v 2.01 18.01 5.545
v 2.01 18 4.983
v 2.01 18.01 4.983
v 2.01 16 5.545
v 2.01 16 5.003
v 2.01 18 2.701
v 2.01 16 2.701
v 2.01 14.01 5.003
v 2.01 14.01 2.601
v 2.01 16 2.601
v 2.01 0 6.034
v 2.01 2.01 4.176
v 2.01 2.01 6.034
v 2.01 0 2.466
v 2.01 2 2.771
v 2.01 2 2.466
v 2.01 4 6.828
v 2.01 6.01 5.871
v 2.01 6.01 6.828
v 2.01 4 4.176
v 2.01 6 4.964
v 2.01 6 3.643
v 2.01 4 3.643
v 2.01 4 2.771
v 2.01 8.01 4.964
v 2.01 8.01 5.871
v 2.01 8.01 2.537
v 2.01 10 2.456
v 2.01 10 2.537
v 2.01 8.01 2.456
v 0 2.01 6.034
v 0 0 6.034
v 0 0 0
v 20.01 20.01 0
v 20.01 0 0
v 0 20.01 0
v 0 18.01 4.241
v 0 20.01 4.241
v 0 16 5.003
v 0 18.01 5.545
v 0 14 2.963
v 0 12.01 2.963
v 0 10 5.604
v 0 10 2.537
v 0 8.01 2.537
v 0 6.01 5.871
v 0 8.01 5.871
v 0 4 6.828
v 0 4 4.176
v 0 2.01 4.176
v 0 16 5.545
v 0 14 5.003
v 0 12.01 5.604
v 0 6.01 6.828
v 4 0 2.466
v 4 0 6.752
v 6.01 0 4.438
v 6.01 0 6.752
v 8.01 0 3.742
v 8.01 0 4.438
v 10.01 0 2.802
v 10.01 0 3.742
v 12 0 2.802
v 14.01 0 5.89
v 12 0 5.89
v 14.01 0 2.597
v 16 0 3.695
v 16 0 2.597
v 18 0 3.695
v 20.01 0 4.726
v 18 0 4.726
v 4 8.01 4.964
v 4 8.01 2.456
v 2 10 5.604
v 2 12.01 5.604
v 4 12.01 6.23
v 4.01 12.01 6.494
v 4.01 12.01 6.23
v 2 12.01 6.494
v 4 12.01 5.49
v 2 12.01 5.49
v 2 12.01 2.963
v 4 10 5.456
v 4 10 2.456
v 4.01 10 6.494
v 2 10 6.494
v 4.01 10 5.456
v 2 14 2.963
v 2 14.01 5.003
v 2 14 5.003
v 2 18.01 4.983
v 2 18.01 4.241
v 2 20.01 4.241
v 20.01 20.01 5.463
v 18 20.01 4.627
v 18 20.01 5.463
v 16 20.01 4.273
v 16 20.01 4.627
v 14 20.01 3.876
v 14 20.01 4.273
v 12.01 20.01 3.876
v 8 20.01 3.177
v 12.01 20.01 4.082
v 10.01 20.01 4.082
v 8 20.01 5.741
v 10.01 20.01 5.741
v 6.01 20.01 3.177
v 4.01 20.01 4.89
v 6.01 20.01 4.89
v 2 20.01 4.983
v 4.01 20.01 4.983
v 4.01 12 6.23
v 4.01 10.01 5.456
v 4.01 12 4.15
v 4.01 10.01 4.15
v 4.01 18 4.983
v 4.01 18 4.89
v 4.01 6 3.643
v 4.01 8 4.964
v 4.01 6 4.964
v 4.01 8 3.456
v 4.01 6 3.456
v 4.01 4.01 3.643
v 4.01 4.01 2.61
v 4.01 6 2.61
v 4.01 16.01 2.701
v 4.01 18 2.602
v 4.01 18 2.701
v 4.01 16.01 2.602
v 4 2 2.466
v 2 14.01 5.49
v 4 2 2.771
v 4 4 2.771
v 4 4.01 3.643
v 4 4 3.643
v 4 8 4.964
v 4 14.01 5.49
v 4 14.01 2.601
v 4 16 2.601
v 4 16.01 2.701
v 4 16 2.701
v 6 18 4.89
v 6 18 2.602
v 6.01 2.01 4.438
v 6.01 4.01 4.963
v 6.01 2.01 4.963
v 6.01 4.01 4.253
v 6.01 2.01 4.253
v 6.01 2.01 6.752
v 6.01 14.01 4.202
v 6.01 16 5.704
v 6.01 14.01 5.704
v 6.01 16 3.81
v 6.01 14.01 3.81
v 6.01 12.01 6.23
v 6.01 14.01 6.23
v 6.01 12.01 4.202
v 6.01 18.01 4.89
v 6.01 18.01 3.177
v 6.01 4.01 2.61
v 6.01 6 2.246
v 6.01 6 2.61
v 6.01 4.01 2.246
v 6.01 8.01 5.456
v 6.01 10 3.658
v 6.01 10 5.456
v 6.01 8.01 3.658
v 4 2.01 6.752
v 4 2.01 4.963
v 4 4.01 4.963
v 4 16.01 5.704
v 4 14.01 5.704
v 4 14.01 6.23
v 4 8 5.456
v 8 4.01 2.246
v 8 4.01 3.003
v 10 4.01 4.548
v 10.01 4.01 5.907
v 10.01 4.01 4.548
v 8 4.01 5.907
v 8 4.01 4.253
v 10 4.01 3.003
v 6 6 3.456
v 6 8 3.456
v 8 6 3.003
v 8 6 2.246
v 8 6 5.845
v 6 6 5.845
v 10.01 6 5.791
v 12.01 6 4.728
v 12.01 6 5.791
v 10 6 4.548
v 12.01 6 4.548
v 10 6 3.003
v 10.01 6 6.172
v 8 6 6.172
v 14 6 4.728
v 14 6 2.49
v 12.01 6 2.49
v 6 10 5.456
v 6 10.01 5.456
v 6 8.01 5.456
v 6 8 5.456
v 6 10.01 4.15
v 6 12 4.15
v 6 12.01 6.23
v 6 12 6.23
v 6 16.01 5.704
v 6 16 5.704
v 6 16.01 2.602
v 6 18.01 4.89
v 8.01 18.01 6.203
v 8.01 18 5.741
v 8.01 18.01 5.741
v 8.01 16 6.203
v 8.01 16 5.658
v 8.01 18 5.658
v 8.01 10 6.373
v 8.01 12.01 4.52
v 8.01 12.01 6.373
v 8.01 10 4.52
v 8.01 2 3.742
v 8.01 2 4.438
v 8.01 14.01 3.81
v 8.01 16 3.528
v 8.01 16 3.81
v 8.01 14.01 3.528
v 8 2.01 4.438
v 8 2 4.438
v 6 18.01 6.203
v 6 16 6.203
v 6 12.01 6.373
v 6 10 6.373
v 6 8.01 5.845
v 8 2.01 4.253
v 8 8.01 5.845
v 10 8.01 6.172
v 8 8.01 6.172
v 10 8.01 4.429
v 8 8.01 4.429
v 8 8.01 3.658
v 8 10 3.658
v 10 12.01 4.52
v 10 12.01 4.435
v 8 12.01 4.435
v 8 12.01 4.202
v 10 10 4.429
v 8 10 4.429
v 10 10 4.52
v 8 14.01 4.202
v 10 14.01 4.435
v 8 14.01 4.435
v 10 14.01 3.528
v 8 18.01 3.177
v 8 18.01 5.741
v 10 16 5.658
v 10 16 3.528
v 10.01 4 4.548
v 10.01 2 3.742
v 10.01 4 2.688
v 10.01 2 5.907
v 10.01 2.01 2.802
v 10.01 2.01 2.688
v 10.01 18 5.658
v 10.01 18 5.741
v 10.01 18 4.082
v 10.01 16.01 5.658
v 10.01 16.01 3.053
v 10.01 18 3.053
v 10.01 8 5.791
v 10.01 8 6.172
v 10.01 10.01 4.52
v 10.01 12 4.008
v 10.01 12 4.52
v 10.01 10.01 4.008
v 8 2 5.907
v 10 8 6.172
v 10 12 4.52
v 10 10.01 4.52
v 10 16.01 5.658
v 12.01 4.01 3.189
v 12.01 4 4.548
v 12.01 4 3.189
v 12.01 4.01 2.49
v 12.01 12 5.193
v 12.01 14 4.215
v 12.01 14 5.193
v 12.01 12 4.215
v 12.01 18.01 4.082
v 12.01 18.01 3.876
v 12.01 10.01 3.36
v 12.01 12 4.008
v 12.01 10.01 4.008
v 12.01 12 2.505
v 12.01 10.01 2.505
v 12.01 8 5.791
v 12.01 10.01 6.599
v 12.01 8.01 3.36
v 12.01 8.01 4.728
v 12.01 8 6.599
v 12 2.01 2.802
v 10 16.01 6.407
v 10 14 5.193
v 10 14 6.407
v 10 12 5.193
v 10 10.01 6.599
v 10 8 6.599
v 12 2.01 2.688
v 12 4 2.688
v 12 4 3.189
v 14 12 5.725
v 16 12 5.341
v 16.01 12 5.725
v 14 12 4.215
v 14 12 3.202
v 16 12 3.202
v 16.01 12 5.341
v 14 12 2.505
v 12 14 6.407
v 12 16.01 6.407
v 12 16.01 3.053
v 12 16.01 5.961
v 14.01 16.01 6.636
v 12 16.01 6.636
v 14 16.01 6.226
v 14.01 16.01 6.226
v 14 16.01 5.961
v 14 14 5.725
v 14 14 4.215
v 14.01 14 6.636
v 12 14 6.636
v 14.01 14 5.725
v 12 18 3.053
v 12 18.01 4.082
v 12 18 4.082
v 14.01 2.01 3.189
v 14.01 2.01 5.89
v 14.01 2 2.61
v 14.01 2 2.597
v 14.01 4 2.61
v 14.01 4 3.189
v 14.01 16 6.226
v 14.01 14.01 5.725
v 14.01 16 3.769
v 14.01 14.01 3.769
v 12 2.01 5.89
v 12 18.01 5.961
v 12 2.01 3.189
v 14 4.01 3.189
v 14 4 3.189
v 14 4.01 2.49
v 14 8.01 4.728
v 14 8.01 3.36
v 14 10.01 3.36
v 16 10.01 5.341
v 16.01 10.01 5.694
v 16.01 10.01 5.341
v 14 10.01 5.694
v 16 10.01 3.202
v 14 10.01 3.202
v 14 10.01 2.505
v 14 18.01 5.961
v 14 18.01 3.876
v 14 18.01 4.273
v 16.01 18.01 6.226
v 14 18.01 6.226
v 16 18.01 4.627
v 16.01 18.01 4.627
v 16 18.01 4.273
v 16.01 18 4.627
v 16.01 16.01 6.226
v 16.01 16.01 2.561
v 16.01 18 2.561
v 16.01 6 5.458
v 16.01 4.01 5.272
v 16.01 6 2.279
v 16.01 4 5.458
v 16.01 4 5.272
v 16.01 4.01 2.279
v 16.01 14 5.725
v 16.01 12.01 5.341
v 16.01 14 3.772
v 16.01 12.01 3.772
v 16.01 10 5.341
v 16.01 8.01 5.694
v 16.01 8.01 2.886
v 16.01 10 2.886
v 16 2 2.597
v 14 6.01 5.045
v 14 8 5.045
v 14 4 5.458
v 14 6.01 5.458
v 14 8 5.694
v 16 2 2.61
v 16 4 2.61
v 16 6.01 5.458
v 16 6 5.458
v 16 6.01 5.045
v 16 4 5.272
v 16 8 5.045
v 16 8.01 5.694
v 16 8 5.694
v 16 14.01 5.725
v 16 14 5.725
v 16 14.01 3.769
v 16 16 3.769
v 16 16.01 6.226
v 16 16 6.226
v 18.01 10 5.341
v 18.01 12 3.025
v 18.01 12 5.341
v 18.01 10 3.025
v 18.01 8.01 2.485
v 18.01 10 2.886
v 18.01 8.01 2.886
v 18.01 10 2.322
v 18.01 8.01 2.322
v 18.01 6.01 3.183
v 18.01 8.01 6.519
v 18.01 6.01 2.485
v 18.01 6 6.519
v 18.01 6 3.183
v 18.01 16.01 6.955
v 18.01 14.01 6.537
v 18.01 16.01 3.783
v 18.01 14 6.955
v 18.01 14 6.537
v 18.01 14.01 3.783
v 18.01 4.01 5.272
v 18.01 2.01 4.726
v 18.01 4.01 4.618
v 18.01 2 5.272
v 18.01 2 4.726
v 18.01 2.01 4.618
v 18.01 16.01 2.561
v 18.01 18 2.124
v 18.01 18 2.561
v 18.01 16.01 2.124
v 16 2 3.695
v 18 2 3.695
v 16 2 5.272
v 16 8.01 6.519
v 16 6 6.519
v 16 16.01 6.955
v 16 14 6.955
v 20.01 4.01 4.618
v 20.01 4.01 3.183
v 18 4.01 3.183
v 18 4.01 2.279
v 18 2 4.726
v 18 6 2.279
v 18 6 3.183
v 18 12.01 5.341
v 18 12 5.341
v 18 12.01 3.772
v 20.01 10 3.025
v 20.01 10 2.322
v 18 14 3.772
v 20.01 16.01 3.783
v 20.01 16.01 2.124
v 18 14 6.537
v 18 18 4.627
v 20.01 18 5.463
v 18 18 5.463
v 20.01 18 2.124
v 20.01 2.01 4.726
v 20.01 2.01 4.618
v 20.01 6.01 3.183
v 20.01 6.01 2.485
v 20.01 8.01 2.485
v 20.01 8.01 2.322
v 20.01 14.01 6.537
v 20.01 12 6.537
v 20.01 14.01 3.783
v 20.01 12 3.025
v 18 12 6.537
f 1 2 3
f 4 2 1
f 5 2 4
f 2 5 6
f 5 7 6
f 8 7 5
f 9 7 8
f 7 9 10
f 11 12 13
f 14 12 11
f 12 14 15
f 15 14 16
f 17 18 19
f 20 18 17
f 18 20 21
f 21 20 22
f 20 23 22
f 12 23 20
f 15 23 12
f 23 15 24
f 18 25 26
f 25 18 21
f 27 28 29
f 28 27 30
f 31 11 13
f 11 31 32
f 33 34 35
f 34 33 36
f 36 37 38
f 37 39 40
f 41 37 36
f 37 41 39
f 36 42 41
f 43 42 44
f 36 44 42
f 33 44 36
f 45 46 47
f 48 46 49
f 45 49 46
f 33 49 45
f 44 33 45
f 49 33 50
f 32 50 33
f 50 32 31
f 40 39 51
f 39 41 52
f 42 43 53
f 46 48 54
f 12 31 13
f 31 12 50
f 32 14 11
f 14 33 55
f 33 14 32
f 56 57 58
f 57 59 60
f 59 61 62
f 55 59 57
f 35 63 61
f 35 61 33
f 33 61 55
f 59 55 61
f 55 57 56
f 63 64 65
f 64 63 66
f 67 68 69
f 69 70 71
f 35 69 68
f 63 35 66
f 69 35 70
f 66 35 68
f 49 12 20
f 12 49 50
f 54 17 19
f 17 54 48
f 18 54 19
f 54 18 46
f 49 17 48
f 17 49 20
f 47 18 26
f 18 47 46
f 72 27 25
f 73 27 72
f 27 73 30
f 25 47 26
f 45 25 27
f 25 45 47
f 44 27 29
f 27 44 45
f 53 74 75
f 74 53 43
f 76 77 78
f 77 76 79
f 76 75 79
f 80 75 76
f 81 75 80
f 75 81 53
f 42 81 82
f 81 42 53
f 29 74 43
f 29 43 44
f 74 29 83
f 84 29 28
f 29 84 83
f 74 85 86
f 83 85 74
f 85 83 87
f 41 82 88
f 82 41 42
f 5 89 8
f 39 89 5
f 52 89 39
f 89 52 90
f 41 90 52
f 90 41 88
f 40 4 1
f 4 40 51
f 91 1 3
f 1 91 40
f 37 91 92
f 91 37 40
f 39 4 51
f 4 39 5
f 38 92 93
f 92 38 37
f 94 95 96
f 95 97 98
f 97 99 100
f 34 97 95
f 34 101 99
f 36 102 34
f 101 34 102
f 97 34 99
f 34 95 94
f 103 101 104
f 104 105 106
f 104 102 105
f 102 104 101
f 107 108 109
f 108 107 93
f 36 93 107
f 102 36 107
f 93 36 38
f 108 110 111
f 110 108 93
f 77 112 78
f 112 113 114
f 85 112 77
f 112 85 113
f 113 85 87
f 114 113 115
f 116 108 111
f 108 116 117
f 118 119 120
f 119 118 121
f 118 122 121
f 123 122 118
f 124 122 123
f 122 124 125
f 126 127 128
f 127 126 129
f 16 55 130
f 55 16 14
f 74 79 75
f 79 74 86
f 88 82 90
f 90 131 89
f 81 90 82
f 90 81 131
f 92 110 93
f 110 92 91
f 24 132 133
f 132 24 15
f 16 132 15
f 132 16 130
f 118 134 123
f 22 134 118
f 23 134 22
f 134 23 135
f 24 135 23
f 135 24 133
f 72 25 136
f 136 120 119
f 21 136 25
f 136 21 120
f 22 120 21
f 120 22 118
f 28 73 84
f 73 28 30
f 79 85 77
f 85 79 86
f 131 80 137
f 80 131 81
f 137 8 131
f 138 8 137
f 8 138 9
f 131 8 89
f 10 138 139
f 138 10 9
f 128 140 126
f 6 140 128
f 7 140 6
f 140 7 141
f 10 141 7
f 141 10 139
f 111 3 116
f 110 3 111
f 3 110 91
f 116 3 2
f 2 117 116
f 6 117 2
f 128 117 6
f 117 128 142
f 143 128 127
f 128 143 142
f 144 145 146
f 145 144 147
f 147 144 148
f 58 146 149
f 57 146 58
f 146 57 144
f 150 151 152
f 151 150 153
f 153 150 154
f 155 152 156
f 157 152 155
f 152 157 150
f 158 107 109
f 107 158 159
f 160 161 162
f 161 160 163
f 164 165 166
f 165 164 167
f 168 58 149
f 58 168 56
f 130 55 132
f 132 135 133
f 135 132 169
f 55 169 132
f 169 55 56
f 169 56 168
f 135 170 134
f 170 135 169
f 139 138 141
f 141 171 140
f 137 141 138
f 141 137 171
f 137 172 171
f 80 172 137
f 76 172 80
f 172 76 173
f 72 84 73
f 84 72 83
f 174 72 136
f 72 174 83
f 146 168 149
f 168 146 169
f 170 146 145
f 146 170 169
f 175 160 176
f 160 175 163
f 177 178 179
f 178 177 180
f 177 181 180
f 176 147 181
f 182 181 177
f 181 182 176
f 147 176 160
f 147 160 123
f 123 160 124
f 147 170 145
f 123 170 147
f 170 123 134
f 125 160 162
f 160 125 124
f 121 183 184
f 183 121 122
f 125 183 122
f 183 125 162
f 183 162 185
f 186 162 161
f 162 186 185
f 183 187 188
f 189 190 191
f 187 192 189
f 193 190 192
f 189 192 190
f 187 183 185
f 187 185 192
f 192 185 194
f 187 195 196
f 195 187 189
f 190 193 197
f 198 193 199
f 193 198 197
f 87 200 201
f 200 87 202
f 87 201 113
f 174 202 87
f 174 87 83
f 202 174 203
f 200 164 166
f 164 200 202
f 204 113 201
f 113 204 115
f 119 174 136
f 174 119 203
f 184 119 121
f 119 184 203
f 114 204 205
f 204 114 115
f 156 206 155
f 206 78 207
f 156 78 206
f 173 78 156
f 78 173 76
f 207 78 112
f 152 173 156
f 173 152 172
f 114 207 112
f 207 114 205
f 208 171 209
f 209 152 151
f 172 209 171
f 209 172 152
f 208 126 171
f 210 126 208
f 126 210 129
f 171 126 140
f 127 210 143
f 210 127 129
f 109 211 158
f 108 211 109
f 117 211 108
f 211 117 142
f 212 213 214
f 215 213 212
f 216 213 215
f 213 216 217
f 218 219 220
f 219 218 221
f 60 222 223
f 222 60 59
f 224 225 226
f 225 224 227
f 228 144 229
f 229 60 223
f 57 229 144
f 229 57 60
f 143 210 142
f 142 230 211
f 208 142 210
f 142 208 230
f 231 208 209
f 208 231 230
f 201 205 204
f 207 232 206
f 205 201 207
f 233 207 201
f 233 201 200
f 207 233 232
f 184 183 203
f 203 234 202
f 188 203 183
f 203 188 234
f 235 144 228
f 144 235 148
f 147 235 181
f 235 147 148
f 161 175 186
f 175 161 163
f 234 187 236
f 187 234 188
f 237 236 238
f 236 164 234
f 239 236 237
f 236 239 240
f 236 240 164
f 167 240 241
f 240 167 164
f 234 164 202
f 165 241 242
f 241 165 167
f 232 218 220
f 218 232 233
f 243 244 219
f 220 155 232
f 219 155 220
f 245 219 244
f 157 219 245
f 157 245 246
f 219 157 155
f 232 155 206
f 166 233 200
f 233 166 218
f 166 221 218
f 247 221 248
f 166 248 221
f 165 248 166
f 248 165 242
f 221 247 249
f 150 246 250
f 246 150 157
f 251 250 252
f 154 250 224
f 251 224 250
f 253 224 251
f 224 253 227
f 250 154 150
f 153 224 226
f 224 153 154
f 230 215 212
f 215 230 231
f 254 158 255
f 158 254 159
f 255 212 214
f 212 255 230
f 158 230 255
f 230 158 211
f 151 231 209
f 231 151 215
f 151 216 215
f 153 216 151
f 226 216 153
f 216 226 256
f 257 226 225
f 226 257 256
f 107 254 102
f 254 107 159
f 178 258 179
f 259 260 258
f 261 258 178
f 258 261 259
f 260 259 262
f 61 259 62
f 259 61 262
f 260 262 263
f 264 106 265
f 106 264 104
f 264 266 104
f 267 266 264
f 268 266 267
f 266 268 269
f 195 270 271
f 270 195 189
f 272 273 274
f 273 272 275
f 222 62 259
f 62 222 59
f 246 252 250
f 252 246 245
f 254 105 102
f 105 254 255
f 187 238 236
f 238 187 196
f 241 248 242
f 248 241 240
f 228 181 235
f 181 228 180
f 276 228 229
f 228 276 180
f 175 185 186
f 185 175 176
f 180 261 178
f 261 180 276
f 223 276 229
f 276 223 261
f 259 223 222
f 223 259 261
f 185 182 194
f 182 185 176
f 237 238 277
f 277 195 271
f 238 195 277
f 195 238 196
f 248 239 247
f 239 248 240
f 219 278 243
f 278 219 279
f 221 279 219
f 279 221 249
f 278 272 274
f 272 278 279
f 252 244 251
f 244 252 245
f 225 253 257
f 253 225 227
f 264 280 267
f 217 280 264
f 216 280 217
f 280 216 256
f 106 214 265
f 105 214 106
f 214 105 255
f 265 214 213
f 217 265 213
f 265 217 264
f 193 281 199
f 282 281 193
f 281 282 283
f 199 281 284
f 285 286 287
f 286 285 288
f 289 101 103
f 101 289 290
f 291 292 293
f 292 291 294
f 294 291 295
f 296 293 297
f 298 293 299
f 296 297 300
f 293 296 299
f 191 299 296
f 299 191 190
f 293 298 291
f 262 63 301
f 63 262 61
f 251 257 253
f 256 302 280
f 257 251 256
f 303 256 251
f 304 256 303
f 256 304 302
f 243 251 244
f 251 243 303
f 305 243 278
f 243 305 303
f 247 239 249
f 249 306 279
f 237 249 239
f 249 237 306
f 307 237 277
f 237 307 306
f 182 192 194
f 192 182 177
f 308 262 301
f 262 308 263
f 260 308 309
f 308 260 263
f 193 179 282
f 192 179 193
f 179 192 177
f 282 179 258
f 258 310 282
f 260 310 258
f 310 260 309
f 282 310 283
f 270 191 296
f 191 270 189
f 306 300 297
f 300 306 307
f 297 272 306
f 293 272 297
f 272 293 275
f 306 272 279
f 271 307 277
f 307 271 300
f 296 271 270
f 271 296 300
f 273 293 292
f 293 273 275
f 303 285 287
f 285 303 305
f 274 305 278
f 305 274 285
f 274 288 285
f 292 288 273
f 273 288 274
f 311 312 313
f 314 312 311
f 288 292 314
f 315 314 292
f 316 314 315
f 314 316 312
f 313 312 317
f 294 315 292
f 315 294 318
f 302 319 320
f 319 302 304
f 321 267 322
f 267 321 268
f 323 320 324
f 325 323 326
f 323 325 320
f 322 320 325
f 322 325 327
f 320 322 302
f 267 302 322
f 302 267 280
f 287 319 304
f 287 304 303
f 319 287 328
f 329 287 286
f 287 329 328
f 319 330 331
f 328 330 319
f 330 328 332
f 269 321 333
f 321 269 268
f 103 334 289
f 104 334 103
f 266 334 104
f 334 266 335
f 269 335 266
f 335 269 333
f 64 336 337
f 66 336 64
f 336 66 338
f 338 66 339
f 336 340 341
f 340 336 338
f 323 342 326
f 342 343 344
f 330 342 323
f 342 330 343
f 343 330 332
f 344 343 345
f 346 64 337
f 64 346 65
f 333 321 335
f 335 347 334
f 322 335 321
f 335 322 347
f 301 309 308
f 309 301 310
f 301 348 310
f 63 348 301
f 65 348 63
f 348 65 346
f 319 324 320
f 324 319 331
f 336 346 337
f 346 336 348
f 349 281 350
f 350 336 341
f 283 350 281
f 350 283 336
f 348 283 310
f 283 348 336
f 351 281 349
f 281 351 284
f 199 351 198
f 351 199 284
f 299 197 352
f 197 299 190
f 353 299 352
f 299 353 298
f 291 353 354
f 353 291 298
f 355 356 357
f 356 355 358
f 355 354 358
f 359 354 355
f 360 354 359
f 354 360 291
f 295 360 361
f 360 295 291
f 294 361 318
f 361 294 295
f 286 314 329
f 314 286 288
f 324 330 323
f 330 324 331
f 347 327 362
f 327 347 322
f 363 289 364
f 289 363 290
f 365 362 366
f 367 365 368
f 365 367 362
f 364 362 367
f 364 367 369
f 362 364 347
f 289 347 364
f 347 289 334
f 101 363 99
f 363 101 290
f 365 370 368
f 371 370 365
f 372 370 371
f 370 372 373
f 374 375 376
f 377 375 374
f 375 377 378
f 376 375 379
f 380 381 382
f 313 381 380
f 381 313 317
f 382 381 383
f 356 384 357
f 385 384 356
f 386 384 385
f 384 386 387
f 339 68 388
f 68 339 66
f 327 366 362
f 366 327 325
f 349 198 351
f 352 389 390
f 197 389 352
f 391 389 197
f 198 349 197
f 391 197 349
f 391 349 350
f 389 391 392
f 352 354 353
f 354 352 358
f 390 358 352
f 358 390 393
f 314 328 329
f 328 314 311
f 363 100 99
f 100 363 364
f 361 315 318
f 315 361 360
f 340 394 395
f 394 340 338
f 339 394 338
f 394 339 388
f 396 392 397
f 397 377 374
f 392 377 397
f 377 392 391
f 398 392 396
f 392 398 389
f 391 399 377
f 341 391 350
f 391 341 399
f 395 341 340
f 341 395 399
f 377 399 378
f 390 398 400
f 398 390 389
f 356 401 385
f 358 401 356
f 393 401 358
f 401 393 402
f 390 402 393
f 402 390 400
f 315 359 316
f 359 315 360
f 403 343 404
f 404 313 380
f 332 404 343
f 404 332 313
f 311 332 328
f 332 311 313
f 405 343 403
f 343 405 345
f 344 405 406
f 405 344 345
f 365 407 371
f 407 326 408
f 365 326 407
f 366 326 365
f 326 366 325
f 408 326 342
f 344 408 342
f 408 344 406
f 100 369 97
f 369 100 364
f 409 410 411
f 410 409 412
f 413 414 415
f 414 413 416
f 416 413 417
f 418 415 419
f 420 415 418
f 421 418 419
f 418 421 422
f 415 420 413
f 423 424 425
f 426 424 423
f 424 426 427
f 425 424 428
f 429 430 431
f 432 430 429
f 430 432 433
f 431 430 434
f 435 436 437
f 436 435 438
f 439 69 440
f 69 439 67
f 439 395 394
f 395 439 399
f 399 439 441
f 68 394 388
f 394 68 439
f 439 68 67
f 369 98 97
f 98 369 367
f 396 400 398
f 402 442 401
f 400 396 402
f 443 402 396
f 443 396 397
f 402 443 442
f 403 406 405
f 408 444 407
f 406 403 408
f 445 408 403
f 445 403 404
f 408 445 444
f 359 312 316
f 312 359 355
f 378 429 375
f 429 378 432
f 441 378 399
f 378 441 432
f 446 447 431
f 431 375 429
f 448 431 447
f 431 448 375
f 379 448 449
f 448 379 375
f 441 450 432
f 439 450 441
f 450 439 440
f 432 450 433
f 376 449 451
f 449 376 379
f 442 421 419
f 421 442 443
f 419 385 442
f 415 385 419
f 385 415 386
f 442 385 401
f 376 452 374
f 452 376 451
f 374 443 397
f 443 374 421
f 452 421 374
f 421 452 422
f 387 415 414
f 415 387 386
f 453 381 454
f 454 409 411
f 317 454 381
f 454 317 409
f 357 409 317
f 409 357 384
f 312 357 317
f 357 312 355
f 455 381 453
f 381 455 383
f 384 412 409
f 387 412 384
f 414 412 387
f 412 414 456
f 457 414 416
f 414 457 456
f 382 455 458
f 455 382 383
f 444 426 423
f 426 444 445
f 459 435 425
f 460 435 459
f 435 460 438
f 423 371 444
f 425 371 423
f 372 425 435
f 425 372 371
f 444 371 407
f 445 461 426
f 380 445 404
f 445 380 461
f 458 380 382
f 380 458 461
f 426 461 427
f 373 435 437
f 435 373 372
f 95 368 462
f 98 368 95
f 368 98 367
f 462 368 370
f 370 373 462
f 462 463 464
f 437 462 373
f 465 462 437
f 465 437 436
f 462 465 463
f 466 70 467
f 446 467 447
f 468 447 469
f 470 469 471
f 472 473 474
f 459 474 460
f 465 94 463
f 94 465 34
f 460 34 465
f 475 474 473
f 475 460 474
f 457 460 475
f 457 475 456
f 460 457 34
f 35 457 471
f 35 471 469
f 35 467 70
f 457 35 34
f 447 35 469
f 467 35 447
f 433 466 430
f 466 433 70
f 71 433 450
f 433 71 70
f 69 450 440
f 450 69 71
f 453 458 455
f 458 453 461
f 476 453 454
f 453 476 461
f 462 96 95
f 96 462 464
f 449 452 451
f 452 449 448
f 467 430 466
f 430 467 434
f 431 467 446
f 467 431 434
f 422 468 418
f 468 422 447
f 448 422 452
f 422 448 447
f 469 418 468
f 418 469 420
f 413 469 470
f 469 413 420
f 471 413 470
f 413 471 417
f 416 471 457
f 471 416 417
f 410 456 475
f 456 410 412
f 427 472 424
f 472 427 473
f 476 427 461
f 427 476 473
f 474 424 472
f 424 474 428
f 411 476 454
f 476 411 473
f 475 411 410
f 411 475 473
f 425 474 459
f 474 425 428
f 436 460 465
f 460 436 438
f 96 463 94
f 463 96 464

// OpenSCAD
// Generate a matrix with random heights.

base_height = 2;
random_height = 5;
num_rows = 10;
num_cols = 10;
step_size = 2;

min_height = base_height;
max_height = base_height + random_height;

// Hack alert:
// The seed param of rands doesn't see to work so using this
// arbitrary string that invalidates the cache of thingiverse's 
// customizer and randomize the model.

// Type here arbitrary text to randomize the model.
rand_seed = "";

eps1 = 0.01 + 0;

module row() {
 for(col = [0 : num_cols-1]) {
    z = rands(min_height, max_height, 1)[0];
    translate([0, col*step_size, 0]) cube([step_size+eps1,step_size+eps1,z]);
  } 
}

for(row = [0 : num_rows-1]) {
     translate([row*step_size, 0, 0]) row();
  
}
